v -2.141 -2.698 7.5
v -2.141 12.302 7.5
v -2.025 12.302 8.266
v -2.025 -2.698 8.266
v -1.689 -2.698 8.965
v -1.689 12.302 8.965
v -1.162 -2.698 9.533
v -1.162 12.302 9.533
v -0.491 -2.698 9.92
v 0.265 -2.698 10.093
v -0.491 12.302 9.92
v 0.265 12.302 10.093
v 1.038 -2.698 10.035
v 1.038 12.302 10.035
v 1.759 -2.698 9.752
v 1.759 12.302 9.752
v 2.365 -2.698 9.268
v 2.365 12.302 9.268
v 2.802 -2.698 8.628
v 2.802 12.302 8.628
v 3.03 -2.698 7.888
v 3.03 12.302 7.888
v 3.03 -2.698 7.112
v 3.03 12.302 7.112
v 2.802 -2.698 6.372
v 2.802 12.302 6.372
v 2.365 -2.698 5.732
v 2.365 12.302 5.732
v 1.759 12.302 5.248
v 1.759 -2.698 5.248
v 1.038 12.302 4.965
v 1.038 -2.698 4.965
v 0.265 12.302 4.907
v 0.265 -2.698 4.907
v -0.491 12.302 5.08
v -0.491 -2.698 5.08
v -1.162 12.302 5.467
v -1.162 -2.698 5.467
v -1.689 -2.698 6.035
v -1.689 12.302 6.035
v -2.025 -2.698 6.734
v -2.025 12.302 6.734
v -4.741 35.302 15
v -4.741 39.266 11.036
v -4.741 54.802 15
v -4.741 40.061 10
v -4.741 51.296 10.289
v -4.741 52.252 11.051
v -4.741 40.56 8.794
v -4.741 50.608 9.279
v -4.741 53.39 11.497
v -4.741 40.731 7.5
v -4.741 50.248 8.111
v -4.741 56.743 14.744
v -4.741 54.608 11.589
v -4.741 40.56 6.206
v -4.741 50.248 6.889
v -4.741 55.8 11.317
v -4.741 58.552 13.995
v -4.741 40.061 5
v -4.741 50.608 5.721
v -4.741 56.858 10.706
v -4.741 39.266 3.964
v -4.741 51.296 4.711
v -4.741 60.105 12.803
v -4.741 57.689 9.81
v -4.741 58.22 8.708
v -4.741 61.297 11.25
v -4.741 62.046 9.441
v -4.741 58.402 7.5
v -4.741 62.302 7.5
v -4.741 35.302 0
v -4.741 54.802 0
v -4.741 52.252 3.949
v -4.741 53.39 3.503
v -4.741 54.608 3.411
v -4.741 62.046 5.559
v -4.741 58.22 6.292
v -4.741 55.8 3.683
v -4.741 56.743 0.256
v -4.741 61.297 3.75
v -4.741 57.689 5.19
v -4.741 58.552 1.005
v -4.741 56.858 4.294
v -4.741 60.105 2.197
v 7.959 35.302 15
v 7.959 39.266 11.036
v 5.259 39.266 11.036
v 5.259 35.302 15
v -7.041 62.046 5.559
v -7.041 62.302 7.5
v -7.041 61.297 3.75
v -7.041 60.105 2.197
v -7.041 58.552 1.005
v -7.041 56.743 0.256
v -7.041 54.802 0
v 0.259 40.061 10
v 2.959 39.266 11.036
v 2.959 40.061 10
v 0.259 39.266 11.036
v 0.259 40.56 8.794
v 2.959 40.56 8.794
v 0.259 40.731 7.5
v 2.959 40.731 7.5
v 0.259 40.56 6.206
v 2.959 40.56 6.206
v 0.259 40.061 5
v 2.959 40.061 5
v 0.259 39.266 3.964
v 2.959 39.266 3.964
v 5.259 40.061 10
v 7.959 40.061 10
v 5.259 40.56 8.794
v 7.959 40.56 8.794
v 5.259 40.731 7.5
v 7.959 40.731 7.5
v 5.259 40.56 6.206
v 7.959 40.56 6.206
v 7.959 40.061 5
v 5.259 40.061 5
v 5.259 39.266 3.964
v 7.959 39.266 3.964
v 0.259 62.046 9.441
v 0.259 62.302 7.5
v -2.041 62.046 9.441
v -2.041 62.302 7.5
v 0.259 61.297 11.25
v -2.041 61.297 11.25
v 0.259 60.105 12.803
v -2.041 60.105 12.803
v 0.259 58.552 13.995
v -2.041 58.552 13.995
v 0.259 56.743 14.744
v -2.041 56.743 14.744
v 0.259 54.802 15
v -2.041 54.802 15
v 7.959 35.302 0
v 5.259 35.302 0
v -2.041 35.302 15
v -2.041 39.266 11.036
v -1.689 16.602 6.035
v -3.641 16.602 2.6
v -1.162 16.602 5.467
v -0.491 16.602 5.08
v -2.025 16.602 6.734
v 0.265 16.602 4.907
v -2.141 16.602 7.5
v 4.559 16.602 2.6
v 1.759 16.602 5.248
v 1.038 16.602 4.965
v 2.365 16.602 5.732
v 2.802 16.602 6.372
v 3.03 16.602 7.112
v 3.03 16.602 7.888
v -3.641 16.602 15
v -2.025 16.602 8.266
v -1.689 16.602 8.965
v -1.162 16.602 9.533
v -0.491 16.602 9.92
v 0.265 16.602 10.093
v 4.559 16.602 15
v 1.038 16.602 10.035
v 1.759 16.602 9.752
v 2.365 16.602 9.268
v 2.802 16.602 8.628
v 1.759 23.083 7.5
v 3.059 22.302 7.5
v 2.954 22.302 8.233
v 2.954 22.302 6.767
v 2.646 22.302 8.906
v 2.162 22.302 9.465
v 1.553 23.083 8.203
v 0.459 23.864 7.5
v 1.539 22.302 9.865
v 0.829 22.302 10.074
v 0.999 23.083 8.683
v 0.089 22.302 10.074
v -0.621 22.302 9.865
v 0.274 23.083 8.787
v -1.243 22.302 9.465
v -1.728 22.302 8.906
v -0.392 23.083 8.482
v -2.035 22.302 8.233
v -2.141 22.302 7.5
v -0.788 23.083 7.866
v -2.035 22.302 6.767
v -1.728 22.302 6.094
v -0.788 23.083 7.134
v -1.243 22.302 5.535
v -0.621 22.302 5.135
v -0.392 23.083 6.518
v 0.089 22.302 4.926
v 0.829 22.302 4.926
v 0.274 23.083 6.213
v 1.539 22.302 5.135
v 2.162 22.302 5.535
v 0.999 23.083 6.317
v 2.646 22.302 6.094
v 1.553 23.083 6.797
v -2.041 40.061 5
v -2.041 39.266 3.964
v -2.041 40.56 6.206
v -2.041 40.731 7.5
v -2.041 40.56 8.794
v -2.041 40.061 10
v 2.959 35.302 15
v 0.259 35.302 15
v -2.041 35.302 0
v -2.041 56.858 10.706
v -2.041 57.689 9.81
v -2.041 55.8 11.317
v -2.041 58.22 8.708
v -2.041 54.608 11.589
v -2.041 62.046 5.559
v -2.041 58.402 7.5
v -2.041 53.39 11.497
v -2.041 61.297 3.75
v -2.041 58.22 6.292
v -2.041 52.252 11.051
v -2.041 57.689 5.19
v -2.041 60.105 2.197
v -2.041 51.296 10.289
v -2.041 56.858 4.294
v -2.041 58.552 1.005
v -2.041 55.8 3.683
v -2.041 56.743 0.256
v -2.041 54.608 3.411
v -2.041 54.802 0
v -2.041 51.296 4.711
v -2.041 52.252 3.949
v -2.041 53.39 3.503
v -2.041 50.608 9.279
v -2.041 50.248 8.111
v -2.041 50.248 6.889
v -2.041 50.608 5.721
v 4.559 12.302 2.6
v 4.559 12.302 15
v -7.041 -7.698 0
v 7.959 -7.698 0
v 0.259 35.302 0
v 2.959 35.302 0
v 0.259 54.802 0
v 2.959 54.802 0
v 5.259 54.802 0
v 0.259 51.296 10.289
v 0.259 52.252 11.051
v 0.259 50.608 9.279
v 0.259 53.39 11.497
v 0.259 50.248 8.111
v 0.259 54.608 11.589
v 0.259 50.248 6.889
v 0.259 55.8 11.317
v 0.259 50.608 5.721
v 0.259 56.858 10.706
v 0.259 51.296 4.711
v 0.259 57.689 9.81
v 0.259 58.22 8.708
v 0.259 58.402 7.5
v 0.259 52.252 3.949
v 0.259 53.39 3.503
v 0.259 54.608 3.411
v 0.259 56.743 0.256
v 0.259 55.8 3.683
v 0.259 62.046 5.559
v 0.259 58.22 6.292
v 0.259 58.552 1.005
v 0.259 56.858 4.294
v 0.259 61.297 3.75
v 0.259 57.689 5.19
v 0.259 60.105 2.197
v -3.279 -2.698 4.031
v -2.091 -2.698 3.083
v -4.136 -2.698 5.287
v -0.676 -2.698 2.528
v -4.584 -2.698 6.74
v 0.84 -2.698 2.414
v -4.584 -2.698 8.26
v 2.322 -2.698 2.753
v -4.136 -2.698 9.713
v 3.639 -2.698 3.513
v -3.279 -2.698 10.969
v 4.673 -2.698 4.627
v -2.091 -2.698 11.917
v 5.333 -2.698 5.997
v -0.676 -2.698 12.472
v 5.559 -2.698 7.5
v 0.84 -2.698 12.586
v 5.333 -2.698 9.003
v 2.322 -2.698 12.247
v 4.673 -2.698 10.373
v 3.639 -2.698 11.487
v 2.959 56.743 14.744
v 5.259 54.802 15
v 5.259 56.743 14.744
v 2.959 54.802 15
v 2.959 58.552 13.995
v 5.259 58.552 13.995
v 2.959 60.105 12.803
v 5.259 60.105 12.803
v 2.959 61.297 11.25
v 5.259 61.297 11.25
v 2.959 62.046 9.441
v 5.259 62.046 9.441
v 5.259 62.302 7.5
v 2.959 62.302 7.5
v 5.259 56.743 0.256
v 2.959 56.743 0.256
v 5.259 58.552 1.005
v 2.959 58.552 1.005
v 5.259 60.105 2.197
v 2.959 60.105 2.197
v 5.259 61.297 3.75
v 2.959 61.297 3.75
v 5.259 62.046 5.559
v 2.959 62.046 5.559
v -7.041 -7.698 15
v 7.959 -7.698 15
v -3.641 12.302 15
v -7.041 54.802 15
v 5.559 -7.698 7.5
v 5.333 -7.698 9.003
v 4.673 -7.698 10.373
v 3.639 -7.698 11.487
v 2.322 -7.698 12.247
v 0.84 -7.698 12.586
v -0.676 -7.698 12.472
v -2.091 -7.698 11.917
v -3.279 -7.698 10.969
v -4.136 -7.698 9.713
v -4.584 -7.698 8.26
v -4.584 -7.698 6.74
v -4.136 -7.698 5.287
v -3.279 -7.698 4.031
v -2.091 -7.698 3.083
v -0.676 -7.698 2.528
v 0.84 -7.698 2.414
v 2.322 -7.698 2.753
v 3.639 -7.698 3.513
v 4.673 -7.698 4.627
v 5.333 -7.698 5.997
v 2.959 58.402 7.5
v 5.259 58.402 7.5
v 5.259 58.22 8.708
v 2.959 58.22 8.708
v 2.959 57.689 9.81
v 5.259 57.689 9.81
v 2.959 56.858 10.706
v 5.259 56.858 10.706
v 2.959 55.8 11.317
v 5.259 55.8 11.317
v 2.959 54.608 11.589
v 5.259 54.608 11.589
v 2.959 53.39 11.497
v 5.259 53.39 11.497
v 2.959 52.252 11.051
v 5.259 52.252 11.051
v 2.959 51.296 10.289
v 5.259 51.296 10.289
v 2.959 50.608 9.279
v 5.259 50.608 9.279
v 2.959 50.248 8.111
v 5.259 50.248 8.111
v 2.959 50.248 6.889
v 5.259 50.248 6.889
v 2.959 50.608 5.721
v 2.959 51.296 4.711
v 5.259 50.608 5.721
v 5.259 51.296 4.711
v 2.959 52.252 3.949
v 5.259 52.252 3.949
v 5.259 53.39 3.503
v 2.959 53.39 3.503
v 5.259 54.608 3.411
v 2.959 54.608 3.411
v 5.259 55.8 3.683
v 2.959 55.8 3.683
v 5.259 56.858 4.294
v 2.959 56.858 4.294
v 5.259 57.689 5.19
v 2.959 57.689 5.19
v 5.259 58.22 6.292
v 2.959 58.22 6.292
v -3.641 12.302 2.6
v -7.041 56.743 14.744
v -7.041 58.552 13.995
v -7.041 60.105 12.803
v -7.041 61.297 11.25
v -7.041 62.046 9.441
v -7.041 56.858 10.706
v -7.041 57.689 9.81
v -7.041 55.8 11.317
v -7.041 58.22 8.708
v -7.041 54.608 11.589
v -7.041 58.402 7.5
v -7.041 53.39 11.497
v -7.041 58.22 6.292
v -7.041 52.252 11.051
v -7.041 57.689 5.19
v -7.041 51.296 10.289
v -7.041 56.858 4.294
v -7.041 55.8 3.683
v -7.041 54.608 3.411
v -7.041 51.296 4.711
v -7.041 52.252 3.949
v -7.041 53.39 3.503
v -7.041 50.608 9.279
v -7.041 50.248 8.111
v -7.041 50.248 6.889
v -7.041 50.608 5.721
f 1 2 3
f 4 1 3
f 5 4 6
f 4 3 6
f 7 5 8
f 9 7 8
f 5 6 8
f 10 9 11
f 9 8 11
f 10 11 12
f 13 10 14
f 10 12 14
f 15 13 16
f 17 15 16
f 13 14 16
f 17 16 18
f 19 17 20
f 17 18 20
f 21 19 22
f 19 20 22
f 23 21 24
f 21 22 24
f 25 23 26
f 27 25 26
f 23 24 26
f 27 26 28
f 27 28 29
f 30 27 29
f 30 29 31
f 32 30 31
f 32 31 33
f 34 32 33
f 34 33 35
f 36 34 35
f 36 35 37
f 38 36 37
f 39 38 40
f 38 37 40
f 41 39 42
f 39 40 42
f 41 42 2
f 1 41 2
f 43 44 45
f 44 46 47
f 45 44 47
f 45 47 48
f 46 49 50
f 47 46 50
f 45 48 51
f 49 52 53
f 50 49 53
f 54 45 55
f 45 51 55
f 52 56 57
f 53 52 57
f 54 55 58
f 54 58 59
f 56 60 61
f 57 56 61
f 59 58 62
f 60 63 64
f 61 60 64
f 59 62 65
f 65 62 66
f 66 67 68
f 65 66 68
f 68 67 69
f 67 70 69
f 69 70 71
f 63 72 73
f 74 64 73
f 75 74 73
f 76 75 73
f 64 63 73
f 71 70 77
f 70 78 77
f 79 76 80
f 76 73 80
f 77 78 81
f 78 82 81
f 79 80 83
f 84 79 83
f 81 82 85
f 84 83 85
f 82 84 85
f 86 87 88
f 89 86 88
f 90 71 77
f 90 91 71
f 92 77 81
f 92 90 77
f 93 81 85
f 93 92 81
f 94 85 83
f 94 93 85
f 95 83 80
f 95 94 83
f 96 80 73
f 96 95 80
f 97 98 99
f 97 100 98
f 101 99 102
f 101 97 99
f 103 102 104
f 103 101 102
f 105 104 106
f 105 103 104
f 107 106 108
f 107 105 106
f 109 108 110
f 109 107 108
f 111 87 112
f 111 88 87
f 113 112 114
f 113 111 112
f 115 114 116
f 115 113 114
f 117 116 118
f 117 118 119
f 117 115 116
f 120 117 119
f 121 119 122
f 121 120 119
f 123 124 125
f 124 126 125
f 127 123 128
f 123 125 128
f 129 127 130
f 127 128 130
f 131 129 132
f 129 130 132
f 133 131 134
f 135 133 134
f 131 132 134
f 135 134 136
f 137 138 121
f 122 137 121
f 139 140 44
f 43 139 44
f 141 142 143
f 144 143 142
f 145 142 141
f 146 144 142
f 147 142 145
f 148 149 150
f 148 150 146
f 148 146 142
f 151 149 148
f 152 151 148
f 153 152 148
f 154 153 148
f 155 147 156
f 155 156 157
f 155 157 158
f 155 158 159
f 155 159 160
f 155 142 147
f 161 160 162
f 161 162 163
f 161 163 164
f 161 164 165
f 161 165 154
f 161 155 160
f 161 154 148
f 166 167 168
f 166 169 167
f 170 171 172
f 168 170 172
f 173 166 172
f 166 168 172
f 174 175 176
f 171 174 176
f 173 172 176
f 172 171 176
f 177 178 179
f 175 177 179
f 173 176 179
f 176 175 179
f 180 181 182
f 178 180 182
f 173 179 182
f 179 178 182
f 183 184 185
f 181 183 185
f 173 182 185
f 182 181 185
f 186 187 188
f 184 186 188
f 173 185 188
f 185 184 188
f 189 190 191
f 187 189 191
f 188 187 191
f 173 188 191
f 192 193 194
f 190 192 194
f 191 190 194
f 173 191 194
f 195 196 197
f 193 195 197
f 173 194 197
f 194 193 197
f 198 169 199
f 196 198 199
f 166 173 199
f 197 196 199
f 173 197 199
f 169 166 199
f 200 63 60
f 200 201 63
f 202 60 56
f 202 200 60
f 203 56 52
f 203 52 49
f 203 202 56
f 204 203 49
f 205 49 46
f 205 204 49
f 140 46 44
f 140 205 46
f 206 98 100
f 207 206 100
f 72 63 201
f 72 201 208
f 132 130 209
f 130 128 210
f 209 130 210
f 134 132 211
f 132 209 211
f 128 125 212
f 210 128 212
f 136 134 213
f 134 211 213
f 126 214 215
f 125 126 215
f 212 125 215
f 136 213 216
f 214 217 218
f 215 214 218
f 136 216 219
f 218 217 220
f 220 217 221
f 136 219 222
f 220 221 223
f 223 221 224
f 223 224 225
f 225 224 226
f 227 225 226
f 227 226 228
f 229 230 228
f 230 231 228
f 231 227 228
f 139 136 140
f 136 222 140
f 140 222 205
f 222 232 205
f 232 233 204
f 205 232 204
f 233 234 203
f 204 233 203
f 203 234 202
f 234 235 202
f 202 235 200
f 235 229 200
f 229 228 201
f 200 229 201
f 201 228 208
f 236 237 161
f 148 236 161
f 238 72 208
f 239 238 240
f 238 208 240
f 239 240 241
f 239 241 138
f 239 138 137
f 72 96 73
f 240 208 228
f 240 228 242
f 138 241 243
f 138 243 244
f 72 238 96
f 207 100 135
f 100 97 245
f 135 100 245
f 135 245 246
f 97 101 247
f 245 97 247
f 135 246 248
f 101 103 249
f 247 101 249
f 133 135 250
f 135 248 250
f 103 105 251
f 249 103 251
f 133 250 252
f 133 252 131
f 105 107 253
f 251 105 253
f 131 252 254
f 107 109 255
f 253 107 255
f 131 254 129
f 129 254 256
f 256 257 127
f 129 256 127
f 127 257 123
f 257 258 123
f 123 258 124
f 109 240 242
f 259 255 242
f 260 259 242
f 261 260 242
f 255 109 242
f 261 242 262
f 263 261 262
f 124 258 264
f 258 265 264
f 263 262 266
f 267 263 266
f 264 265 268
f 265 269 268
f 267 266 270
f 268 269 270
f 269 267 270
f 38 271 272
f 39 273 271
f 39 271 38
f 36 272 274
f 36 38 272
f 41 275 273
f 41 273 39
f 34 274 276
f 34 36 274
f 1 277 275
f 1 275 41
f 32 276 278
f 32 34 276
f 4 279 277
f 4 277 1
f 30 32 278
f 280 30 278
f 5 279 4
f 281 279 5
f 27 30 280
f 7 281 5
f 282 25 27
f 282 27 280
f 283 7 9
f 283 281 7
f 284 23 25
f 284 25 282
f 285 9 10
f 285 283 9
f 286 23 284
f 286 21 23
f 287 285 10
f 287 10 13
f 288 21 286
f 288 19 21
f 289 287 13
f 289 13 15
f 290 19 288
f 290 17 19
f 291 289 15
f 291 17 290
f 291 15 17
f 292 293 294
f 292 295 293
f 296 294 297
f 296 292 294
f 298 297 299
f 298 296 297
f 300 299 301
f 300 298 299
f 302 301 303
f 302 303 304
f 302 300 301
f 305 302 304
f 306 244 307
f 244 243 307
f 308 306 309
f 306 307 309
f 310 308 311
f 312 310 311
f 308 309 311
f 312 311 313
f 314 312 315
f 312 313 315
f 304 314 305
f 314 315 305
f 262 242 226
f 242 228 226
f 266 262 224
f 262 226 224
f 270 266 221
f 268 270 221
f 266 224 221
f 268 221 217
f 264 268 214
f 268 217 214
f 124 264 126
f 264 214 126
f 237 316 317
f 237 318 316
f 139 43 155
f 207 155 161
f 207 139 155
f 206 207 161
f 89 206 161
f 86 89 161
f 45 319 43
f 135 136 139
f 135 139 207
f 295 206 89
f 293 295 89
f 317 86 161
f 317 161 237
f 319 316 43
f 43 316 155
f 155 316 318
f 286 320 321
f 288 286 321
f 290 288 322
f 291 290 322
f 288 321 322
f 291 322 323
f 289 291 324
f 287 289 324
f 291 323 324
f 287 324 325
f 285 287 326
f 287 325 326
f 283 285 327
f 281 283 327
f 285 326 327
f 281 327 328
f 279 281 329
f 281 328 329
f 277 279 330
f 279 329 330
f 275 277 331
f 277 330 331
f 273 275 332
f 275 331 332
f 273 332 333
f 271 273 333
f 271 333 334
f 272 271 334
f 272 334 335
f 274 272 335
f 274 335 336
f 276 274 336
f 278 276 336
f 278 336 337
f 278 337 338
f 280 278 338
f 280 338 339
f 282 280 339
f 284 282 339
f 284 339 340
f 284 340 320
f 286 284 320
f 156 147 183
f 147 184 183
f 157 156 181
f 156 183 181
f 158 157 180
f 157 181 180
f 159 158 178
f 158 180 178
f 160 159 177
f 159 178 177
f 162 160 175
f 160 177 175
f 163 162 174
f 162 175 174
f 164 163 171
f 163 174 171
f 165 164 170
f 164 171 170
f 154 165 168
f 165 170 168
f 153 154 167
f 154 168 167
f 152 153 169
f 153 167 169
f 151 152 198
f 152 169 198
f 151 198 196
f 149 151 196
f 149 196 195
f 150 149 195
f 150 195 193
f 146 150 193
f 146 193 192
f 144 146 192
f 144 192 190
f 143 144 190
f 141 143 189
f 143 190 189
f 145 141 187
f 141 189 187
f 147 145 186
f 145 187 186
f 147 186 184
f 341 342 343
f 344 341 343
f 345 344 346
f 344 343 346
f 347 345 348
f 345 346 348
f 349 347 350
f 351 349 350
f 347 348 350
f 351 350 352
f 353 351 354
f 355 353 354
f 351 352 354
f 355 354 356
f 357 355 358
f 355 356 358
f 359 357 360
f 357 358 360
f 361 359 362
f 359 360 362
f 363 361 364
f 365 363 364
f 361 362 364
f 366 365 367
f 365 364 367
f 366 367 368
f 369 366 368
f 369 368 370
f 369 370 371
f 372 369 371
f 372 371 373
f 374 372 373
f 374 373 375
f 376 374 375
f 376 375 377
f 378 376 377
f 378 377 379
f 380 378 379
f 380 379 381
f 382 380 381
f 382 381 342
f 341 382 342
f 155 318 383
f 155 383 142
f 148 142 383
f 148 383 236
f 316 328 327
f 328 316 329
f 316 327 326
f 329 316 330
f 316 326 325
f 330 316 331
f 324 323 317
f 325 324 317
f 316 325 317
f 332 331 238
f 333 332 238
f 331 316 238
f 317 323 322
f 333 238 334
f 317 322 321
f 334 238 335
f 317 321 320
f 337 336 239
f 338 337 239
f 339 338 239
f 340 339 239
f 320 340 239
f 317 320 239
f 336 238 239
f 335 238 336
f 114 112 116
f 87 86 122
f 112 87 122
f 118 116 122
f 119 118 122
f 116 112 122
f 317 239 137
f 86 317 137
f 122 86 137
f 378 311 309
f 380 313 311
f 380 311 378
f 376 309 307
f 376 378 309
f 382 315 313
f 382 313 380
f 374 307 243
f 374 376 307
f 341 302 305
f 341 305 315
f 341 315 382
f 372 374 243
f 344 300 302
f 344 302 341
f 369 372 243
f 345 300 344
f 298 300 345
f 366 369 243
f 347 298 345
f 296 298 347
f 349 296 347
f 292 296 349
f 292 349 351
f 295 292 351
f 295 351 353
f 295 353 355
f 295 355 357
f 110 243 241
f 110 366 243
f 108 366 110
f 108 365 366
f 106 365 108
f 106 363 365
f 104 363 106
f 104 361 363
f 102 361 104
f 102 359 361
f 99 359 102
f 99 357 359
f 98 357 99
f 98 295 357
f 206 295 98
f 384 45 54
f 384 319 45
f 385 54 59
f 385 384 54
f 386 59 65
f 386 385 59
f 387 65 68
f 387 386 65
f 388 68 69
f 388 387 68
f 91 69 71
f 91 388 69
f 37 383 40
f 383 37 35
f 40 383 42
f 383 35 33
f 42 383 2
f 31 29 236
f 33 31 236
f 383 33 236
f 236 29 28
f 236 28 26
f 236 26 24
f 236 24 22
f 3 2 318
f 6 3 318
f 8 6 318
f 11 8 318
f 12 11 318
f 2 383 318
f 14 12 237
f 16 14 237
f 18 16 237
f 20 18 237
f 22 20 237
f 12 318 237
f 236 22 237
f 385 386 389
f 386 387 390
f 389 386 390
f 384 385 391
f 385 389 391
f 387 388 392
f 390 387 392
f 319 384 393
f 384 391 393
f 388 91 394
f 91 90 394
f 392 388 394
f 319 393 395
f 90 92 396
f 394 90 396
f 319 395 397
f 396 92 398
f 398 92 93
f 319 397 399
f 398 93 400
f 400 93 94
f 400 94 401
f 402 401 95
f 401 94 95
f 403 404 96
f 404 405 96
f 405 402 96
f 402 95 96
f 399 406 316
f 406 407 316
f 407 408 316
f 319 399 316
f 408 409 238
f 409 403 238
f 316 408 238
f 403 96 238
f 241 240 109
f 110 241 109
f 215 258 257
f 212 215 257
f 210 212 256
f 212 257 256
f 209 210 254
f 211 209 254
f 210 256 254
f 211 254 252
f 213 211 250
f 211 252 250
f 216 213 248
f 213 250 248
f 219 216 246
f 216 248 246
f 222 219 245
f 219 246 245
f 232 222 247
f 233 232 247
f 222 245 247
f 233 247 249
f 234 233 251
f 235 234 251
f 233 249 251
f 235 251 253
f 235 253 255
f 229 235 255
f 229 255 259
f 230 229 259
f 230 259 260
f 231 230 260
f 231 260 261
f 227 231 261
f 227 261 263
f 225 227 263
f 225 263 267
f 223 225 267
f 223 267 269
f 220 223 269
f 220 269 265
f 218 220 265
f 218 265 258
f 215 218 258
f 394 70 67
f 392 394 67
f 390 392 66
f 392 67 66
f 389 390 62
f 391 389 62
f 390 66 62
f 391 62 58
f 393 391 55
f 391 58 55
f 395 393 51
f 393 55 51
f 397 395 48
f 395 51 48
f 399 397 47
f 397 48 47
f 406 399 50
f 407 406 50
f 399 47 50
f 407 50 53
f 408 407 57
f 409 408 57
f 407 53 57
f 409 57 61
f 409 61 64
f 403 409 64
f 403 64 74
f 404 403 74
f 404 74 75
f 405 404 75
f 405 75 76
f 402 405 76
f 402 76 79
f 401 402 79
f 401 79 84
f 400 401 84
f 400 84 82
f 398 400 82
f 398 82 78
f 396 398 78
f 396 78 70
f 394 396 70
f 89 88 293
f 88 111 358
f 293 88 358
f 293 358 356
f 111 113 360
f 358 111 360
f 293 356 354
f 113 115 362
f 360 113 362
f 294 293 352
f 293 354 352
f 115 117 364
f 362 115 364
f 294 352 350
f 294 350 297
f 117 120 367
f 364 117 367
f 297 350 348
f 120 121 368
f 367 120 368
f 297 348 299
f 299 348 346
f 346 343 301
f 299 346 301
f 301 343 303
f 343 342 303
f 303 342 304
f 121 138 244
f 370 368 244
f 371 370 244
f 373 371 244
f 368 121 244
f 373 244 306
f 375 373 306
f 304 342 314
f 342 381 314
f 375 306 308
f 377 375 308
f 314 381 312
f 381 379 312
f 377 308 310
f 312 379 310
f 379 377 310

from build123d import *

# Parameters (mm, degrees)
F1_DEPTH       = 15
F3_D           = 5.2
F3_DEPTH       = 30
F3_CBORE_D     = 10.2
F3_CBORE_DEPTH = 5
F3_TIP         = 1.5622376095
F4_W           = 8.2
F4_H           = 4.3
F5_DEPTH       = 12.4
F6_R           = 4.1
F7_DEPTH       = 25
F8_R           = 7.5
F9_R           = 7.5
F10_R          = 7.49999
F11_SIZE       = 11
F12_T1_DEPTH   = 2.7
F12_T3_DEPTH   = 2.7
F12_T5_DEPTH   = 30.9885128676
F12_T10_DEPTH  = 59.2770257353
F12_T15_DEPTH  = 59.2770257353
F12_T21_DEPTH  = 59.2770257353
F12_T26_DEPTH  = 59.2770257353
F12_T32_DEPTH  = 59.2770257353
F12_T38_DEPTH  = 59.2770257353
F13_R          = 5


# Not quite as in the source:
# - a fillet or chamfer that OpenCascade refuses, or shapes differently, is made with other operations: its cross-section is extruded or revolved along the edge and cut away or added
# - a fillet or chamfer is up to 0.001 mm smaller than in the source, because OpenCascade refuses the exact size


with BuildPart() as f1:
    # F0 (on Top) → F1 (new body)
    with BuildSketch(Plane.XY):
        Polygon((-7.0407824647, 62.3018580846), (-7.0407824647, -7.6981419154), (7.9592175353, -7.6981419154), (7.9592175353, 46.3018580846), (5.2592175353, 46.3018580846), (5.2592175353, 62.3018580846), (2.9592175353, 62.3018580846), (2.9592175353, 46.3018580846), (0.2592175353, 46.3018580846), (0.2592175353, 62.3018580846), (-2.0407824647, 62.3018580846), (-2.0407824647, 46.3018580846), (-4.7407824647, 46.3018580846), (-4.7407824647, 62.3018580846), align=None)
    extrude(amount=F1_DEPTH)

    # F3
    with Locations(Plane.XZ.offset(7.6981419154)):
        with Locations((0.4592175353, 7.5)):
            CounterBoreHole(F3_D / 2, F3_CBORE_D / 2, F3_CBORE_DEPTH, depth=F3_DEPTH)
            with Locations((0, 0, -(F3_DEPTH + F3_TIP / 2))):  # 118° drill point
                Cone(0, F3_D / 2, F3_TIP, mode=Mode.SUBTRACT)

    # F4 (on face) → F5 (cut)
    with BuildSketch(Plane.XY.offset(15)):
        with Locations((0.4592175353, 14.4518580846)):
            Rectangle(F4_W, F4_H)
    extrude(amount=-F5_DEPTH, mode=Mode.SUBTRACT)

    # F6 (on face) → F7 (cut)
    with BuildSketch(Plane.YZ.offset(5.2592175353)):
        with Locations((54.3018580846, 7.5)):
            Circle(F6_R)
    extrude(amount=-F7_DEPTH, mode=Mode.SUBTRACT)

    # F8
    f8_edges = [f1.edges().sort_by_distance(p)[0] for p in [
        (-5.890782, 62.301858, 0),
    ]]
    fillet(f8_edges, radius=F8_R)

    # F9
    f9_edges = [f1.edges().sort_by_distance(p)[0] for p in [
        (-0.890782, 62.301858, 0),
        (4.109218, 62.301858, 0),
    ]]
    fillet(f9_edges, radius=F9_R)

    # F10 (radius 7.5 in the source; OpenCascade refuses exactly that, so slightly less here)
    f10_edges = [f1.edges().sort_by_distance(p)[0] for p in [
        (-5.890782, 62.301858, 15),
        (-0.890782, 62.301858, 15),
        (4.109218, 62.301858, 15),
    ]]
    fillet(f10_edges, radius=F10_R)

    # F11
    f11_edges = [f1.edges().sort_by_distance(p)[0] for p in [
        (-3.390782, 46.301858, 15),
        (1.609218, 46.301858, 15),
        (6.609218, 46.301858, 15),
    ]]
    chamfer(f11_edges, length=F11_SIZE)

    # F12: chamfer of 11 on 3 edges, made by hand

    # F12_s2 → F12_t1 (cut)
    with BuildSketch(Plane.YZ.offset(-4.7407824647)):
        Polygon((46.3018580846, 11), (35.3018580846, 0), (46.3018580846, 0), align=None)
    extrude(amount=F12_T1_DEPTH, mode=Mode.SUBTRACT)

    # F12_s4 → F12_t3 (cut)
    with BuildSketch(Plane.YZ.offset(0.2592175353)):
        Polygon((35.3018580846, 0), (46.3018580846, 11), (46.3018580846, 0), align=None)
    extrude(amount=F12_T3_DEPTH, mode=Mode.SUBTRACT)

    # F12_s6 → F12_t5 (cut)
    with BuildSketch(Plane.YZ.offset(5.2592175353)):
        Polygon((35.3018580846, 0), (46.3018580846, 11), (46.3018580846, 0), align=None)
    extrude(amount=F12_T5_DEPTH, mode=Mode.SUBTRACT)


with BuildPart() as f12_tool8:
    # F12_s9 → F12_t10 (new body)
    with BuildSketch(Plane.YZ.offset(26.247730403)):
        Polygon((46.3018580846, 11), (35.3018580846, 0), (46.3018580846, 0), align=None)
    extrude(amount=-F12_T10_DEPTH)

    split(bisect_by=Plane.YZ.offset(5.2592175353), keep=Keep.TOP)


with BuildPart() as f1_1:
    add(f1.part)

    # F12_t7: cut F12_tool8
    add(f12_tool8.part, mode=Mode.SUBTRACT)


with BuildPart() as f12_tool13:
    # F12_s14 → F12_t15 (new body)
    with BuildSketch(Plane.YZ.offset(26.247730403)):
        Polygon((46.3018580846, 11), (35.3018580846, 0), (46.3018580846, 0), align=None)
    extrude(amount=-F12_T15_DEPTH)

    split(bisect_by=Plane.YZ.offset(0.2592175353), keep=Keep.TOP)

    split(bisect_by=Plane.YZ.offset(2.9592175353), keep=Keep.BOTTOM)


with BuildPart() as f1_2:
    add(f1_1.part)

    # F12_t12: cut F12_tool13
    add(f12_tool13.part, mode=Mode.SUBTRACT)


with BuildPart() as f12_tool19:
    # F12_s20 → F12_t21 (new body)
    with BuildSketch(Plane.YZ.offset(31.247730403)):
        Polygon((35.3018580846, 0), (46.3018580846, 11), (46.3018580846, 0), align=None)
    extrude(amount=-F12_T21_DEPTH)

    split(bisect_by=Plane.YZ.offset(5.2592175353), keep=Keep.TOP)


with BuildPart() as f1_3:
    add(f1_2.part)

    # F12_t18: cut F12_tool19
    add(f12_tool19.part, mode=Mode.SUBTRACT)


with BuildPart() as f12_tool24:
    # F12_s25 → F12_t26 (new body)
    with BuildSketch(Plane.YZ.offset(31.247730403)):
        Polygon((35.3018580846, 0), (46.3018580846, 11), (46.3018580846, 0), align=None)
    extrude(amount=-F12_T26_DEPTH)

    split(bisect_by=Plane.YZ.offset(-2.0407824647), keep=Keep.BOTTOM)

    split(bisect_by=Plane.YZ.offset(-4.7407824647), keep=Keep.TOP)


with BuildPart() as f1_4:
    add(f1_3.part)

    # F12_t23: cut F12_tool24
    add(f12_tool24.part, mode=Mode.SUBTRACT)


with BuildPart() as f12_tool30:
    # F12_s31 → F12_t32 (new body)
    with BuildSketch(Plane.YZ.offset(36.247730403)):
        Polygon((35.3018580846, 0), (46.3018580846, 11), (46.3018580846, 0), align=None)
    extrude(amount=-F12_T32_DEPTH)

    split(bisect_by=Plane.YZ.offset(0.2592175353), keep=Keep.TOP)

    split(bisect_by=Plane.YZ.offset(2.9592175353), keep=Keep.BOTTOM)


with BuildPart() as f1_5:
    add(f1_4.part)

    # F12_t29: cut F12_tool30
    add(f12_tool30.part, mode=Mode.SUBTRACT)


with BuildPart() as f12_tool36:
    # F12_s37 → F12_t38 (new body)
    with BuildSketch(Plane.YZ.offset(36.247730403)):
        Polygon((35.3018580846, 0), (46.3018580846, 11), (46.3018580846, 0), align=None)
    extrude(amount=-F12_T38_DEPTH)

    split(bisect_by=Plane.YZ.offset(-2.0407824647), keep=Keep.BOTTOM)

    split(bisect_by=Plane.YZ.offset(-4.7407824647), keep=Keep.TOP)


with BuildPart() as f1_6:
    add(f1_5.part)

    # F12_t35: cut F12_tool36
    add(f12_tool36.part, mode=Mode.SUBTRACT)

    # F13
    f13_edges = [f1_6.edges().sort_by_distance(p)[0] for p in [
        (1.609218, 42.801858, 7.5),
        (6.609218, 42.801858, 7.5),
        (-3.390782, 42.801858, 7.5),
    ]]
    fillet(f13_edges, radius=F13_R)


solid = f1_6.part
